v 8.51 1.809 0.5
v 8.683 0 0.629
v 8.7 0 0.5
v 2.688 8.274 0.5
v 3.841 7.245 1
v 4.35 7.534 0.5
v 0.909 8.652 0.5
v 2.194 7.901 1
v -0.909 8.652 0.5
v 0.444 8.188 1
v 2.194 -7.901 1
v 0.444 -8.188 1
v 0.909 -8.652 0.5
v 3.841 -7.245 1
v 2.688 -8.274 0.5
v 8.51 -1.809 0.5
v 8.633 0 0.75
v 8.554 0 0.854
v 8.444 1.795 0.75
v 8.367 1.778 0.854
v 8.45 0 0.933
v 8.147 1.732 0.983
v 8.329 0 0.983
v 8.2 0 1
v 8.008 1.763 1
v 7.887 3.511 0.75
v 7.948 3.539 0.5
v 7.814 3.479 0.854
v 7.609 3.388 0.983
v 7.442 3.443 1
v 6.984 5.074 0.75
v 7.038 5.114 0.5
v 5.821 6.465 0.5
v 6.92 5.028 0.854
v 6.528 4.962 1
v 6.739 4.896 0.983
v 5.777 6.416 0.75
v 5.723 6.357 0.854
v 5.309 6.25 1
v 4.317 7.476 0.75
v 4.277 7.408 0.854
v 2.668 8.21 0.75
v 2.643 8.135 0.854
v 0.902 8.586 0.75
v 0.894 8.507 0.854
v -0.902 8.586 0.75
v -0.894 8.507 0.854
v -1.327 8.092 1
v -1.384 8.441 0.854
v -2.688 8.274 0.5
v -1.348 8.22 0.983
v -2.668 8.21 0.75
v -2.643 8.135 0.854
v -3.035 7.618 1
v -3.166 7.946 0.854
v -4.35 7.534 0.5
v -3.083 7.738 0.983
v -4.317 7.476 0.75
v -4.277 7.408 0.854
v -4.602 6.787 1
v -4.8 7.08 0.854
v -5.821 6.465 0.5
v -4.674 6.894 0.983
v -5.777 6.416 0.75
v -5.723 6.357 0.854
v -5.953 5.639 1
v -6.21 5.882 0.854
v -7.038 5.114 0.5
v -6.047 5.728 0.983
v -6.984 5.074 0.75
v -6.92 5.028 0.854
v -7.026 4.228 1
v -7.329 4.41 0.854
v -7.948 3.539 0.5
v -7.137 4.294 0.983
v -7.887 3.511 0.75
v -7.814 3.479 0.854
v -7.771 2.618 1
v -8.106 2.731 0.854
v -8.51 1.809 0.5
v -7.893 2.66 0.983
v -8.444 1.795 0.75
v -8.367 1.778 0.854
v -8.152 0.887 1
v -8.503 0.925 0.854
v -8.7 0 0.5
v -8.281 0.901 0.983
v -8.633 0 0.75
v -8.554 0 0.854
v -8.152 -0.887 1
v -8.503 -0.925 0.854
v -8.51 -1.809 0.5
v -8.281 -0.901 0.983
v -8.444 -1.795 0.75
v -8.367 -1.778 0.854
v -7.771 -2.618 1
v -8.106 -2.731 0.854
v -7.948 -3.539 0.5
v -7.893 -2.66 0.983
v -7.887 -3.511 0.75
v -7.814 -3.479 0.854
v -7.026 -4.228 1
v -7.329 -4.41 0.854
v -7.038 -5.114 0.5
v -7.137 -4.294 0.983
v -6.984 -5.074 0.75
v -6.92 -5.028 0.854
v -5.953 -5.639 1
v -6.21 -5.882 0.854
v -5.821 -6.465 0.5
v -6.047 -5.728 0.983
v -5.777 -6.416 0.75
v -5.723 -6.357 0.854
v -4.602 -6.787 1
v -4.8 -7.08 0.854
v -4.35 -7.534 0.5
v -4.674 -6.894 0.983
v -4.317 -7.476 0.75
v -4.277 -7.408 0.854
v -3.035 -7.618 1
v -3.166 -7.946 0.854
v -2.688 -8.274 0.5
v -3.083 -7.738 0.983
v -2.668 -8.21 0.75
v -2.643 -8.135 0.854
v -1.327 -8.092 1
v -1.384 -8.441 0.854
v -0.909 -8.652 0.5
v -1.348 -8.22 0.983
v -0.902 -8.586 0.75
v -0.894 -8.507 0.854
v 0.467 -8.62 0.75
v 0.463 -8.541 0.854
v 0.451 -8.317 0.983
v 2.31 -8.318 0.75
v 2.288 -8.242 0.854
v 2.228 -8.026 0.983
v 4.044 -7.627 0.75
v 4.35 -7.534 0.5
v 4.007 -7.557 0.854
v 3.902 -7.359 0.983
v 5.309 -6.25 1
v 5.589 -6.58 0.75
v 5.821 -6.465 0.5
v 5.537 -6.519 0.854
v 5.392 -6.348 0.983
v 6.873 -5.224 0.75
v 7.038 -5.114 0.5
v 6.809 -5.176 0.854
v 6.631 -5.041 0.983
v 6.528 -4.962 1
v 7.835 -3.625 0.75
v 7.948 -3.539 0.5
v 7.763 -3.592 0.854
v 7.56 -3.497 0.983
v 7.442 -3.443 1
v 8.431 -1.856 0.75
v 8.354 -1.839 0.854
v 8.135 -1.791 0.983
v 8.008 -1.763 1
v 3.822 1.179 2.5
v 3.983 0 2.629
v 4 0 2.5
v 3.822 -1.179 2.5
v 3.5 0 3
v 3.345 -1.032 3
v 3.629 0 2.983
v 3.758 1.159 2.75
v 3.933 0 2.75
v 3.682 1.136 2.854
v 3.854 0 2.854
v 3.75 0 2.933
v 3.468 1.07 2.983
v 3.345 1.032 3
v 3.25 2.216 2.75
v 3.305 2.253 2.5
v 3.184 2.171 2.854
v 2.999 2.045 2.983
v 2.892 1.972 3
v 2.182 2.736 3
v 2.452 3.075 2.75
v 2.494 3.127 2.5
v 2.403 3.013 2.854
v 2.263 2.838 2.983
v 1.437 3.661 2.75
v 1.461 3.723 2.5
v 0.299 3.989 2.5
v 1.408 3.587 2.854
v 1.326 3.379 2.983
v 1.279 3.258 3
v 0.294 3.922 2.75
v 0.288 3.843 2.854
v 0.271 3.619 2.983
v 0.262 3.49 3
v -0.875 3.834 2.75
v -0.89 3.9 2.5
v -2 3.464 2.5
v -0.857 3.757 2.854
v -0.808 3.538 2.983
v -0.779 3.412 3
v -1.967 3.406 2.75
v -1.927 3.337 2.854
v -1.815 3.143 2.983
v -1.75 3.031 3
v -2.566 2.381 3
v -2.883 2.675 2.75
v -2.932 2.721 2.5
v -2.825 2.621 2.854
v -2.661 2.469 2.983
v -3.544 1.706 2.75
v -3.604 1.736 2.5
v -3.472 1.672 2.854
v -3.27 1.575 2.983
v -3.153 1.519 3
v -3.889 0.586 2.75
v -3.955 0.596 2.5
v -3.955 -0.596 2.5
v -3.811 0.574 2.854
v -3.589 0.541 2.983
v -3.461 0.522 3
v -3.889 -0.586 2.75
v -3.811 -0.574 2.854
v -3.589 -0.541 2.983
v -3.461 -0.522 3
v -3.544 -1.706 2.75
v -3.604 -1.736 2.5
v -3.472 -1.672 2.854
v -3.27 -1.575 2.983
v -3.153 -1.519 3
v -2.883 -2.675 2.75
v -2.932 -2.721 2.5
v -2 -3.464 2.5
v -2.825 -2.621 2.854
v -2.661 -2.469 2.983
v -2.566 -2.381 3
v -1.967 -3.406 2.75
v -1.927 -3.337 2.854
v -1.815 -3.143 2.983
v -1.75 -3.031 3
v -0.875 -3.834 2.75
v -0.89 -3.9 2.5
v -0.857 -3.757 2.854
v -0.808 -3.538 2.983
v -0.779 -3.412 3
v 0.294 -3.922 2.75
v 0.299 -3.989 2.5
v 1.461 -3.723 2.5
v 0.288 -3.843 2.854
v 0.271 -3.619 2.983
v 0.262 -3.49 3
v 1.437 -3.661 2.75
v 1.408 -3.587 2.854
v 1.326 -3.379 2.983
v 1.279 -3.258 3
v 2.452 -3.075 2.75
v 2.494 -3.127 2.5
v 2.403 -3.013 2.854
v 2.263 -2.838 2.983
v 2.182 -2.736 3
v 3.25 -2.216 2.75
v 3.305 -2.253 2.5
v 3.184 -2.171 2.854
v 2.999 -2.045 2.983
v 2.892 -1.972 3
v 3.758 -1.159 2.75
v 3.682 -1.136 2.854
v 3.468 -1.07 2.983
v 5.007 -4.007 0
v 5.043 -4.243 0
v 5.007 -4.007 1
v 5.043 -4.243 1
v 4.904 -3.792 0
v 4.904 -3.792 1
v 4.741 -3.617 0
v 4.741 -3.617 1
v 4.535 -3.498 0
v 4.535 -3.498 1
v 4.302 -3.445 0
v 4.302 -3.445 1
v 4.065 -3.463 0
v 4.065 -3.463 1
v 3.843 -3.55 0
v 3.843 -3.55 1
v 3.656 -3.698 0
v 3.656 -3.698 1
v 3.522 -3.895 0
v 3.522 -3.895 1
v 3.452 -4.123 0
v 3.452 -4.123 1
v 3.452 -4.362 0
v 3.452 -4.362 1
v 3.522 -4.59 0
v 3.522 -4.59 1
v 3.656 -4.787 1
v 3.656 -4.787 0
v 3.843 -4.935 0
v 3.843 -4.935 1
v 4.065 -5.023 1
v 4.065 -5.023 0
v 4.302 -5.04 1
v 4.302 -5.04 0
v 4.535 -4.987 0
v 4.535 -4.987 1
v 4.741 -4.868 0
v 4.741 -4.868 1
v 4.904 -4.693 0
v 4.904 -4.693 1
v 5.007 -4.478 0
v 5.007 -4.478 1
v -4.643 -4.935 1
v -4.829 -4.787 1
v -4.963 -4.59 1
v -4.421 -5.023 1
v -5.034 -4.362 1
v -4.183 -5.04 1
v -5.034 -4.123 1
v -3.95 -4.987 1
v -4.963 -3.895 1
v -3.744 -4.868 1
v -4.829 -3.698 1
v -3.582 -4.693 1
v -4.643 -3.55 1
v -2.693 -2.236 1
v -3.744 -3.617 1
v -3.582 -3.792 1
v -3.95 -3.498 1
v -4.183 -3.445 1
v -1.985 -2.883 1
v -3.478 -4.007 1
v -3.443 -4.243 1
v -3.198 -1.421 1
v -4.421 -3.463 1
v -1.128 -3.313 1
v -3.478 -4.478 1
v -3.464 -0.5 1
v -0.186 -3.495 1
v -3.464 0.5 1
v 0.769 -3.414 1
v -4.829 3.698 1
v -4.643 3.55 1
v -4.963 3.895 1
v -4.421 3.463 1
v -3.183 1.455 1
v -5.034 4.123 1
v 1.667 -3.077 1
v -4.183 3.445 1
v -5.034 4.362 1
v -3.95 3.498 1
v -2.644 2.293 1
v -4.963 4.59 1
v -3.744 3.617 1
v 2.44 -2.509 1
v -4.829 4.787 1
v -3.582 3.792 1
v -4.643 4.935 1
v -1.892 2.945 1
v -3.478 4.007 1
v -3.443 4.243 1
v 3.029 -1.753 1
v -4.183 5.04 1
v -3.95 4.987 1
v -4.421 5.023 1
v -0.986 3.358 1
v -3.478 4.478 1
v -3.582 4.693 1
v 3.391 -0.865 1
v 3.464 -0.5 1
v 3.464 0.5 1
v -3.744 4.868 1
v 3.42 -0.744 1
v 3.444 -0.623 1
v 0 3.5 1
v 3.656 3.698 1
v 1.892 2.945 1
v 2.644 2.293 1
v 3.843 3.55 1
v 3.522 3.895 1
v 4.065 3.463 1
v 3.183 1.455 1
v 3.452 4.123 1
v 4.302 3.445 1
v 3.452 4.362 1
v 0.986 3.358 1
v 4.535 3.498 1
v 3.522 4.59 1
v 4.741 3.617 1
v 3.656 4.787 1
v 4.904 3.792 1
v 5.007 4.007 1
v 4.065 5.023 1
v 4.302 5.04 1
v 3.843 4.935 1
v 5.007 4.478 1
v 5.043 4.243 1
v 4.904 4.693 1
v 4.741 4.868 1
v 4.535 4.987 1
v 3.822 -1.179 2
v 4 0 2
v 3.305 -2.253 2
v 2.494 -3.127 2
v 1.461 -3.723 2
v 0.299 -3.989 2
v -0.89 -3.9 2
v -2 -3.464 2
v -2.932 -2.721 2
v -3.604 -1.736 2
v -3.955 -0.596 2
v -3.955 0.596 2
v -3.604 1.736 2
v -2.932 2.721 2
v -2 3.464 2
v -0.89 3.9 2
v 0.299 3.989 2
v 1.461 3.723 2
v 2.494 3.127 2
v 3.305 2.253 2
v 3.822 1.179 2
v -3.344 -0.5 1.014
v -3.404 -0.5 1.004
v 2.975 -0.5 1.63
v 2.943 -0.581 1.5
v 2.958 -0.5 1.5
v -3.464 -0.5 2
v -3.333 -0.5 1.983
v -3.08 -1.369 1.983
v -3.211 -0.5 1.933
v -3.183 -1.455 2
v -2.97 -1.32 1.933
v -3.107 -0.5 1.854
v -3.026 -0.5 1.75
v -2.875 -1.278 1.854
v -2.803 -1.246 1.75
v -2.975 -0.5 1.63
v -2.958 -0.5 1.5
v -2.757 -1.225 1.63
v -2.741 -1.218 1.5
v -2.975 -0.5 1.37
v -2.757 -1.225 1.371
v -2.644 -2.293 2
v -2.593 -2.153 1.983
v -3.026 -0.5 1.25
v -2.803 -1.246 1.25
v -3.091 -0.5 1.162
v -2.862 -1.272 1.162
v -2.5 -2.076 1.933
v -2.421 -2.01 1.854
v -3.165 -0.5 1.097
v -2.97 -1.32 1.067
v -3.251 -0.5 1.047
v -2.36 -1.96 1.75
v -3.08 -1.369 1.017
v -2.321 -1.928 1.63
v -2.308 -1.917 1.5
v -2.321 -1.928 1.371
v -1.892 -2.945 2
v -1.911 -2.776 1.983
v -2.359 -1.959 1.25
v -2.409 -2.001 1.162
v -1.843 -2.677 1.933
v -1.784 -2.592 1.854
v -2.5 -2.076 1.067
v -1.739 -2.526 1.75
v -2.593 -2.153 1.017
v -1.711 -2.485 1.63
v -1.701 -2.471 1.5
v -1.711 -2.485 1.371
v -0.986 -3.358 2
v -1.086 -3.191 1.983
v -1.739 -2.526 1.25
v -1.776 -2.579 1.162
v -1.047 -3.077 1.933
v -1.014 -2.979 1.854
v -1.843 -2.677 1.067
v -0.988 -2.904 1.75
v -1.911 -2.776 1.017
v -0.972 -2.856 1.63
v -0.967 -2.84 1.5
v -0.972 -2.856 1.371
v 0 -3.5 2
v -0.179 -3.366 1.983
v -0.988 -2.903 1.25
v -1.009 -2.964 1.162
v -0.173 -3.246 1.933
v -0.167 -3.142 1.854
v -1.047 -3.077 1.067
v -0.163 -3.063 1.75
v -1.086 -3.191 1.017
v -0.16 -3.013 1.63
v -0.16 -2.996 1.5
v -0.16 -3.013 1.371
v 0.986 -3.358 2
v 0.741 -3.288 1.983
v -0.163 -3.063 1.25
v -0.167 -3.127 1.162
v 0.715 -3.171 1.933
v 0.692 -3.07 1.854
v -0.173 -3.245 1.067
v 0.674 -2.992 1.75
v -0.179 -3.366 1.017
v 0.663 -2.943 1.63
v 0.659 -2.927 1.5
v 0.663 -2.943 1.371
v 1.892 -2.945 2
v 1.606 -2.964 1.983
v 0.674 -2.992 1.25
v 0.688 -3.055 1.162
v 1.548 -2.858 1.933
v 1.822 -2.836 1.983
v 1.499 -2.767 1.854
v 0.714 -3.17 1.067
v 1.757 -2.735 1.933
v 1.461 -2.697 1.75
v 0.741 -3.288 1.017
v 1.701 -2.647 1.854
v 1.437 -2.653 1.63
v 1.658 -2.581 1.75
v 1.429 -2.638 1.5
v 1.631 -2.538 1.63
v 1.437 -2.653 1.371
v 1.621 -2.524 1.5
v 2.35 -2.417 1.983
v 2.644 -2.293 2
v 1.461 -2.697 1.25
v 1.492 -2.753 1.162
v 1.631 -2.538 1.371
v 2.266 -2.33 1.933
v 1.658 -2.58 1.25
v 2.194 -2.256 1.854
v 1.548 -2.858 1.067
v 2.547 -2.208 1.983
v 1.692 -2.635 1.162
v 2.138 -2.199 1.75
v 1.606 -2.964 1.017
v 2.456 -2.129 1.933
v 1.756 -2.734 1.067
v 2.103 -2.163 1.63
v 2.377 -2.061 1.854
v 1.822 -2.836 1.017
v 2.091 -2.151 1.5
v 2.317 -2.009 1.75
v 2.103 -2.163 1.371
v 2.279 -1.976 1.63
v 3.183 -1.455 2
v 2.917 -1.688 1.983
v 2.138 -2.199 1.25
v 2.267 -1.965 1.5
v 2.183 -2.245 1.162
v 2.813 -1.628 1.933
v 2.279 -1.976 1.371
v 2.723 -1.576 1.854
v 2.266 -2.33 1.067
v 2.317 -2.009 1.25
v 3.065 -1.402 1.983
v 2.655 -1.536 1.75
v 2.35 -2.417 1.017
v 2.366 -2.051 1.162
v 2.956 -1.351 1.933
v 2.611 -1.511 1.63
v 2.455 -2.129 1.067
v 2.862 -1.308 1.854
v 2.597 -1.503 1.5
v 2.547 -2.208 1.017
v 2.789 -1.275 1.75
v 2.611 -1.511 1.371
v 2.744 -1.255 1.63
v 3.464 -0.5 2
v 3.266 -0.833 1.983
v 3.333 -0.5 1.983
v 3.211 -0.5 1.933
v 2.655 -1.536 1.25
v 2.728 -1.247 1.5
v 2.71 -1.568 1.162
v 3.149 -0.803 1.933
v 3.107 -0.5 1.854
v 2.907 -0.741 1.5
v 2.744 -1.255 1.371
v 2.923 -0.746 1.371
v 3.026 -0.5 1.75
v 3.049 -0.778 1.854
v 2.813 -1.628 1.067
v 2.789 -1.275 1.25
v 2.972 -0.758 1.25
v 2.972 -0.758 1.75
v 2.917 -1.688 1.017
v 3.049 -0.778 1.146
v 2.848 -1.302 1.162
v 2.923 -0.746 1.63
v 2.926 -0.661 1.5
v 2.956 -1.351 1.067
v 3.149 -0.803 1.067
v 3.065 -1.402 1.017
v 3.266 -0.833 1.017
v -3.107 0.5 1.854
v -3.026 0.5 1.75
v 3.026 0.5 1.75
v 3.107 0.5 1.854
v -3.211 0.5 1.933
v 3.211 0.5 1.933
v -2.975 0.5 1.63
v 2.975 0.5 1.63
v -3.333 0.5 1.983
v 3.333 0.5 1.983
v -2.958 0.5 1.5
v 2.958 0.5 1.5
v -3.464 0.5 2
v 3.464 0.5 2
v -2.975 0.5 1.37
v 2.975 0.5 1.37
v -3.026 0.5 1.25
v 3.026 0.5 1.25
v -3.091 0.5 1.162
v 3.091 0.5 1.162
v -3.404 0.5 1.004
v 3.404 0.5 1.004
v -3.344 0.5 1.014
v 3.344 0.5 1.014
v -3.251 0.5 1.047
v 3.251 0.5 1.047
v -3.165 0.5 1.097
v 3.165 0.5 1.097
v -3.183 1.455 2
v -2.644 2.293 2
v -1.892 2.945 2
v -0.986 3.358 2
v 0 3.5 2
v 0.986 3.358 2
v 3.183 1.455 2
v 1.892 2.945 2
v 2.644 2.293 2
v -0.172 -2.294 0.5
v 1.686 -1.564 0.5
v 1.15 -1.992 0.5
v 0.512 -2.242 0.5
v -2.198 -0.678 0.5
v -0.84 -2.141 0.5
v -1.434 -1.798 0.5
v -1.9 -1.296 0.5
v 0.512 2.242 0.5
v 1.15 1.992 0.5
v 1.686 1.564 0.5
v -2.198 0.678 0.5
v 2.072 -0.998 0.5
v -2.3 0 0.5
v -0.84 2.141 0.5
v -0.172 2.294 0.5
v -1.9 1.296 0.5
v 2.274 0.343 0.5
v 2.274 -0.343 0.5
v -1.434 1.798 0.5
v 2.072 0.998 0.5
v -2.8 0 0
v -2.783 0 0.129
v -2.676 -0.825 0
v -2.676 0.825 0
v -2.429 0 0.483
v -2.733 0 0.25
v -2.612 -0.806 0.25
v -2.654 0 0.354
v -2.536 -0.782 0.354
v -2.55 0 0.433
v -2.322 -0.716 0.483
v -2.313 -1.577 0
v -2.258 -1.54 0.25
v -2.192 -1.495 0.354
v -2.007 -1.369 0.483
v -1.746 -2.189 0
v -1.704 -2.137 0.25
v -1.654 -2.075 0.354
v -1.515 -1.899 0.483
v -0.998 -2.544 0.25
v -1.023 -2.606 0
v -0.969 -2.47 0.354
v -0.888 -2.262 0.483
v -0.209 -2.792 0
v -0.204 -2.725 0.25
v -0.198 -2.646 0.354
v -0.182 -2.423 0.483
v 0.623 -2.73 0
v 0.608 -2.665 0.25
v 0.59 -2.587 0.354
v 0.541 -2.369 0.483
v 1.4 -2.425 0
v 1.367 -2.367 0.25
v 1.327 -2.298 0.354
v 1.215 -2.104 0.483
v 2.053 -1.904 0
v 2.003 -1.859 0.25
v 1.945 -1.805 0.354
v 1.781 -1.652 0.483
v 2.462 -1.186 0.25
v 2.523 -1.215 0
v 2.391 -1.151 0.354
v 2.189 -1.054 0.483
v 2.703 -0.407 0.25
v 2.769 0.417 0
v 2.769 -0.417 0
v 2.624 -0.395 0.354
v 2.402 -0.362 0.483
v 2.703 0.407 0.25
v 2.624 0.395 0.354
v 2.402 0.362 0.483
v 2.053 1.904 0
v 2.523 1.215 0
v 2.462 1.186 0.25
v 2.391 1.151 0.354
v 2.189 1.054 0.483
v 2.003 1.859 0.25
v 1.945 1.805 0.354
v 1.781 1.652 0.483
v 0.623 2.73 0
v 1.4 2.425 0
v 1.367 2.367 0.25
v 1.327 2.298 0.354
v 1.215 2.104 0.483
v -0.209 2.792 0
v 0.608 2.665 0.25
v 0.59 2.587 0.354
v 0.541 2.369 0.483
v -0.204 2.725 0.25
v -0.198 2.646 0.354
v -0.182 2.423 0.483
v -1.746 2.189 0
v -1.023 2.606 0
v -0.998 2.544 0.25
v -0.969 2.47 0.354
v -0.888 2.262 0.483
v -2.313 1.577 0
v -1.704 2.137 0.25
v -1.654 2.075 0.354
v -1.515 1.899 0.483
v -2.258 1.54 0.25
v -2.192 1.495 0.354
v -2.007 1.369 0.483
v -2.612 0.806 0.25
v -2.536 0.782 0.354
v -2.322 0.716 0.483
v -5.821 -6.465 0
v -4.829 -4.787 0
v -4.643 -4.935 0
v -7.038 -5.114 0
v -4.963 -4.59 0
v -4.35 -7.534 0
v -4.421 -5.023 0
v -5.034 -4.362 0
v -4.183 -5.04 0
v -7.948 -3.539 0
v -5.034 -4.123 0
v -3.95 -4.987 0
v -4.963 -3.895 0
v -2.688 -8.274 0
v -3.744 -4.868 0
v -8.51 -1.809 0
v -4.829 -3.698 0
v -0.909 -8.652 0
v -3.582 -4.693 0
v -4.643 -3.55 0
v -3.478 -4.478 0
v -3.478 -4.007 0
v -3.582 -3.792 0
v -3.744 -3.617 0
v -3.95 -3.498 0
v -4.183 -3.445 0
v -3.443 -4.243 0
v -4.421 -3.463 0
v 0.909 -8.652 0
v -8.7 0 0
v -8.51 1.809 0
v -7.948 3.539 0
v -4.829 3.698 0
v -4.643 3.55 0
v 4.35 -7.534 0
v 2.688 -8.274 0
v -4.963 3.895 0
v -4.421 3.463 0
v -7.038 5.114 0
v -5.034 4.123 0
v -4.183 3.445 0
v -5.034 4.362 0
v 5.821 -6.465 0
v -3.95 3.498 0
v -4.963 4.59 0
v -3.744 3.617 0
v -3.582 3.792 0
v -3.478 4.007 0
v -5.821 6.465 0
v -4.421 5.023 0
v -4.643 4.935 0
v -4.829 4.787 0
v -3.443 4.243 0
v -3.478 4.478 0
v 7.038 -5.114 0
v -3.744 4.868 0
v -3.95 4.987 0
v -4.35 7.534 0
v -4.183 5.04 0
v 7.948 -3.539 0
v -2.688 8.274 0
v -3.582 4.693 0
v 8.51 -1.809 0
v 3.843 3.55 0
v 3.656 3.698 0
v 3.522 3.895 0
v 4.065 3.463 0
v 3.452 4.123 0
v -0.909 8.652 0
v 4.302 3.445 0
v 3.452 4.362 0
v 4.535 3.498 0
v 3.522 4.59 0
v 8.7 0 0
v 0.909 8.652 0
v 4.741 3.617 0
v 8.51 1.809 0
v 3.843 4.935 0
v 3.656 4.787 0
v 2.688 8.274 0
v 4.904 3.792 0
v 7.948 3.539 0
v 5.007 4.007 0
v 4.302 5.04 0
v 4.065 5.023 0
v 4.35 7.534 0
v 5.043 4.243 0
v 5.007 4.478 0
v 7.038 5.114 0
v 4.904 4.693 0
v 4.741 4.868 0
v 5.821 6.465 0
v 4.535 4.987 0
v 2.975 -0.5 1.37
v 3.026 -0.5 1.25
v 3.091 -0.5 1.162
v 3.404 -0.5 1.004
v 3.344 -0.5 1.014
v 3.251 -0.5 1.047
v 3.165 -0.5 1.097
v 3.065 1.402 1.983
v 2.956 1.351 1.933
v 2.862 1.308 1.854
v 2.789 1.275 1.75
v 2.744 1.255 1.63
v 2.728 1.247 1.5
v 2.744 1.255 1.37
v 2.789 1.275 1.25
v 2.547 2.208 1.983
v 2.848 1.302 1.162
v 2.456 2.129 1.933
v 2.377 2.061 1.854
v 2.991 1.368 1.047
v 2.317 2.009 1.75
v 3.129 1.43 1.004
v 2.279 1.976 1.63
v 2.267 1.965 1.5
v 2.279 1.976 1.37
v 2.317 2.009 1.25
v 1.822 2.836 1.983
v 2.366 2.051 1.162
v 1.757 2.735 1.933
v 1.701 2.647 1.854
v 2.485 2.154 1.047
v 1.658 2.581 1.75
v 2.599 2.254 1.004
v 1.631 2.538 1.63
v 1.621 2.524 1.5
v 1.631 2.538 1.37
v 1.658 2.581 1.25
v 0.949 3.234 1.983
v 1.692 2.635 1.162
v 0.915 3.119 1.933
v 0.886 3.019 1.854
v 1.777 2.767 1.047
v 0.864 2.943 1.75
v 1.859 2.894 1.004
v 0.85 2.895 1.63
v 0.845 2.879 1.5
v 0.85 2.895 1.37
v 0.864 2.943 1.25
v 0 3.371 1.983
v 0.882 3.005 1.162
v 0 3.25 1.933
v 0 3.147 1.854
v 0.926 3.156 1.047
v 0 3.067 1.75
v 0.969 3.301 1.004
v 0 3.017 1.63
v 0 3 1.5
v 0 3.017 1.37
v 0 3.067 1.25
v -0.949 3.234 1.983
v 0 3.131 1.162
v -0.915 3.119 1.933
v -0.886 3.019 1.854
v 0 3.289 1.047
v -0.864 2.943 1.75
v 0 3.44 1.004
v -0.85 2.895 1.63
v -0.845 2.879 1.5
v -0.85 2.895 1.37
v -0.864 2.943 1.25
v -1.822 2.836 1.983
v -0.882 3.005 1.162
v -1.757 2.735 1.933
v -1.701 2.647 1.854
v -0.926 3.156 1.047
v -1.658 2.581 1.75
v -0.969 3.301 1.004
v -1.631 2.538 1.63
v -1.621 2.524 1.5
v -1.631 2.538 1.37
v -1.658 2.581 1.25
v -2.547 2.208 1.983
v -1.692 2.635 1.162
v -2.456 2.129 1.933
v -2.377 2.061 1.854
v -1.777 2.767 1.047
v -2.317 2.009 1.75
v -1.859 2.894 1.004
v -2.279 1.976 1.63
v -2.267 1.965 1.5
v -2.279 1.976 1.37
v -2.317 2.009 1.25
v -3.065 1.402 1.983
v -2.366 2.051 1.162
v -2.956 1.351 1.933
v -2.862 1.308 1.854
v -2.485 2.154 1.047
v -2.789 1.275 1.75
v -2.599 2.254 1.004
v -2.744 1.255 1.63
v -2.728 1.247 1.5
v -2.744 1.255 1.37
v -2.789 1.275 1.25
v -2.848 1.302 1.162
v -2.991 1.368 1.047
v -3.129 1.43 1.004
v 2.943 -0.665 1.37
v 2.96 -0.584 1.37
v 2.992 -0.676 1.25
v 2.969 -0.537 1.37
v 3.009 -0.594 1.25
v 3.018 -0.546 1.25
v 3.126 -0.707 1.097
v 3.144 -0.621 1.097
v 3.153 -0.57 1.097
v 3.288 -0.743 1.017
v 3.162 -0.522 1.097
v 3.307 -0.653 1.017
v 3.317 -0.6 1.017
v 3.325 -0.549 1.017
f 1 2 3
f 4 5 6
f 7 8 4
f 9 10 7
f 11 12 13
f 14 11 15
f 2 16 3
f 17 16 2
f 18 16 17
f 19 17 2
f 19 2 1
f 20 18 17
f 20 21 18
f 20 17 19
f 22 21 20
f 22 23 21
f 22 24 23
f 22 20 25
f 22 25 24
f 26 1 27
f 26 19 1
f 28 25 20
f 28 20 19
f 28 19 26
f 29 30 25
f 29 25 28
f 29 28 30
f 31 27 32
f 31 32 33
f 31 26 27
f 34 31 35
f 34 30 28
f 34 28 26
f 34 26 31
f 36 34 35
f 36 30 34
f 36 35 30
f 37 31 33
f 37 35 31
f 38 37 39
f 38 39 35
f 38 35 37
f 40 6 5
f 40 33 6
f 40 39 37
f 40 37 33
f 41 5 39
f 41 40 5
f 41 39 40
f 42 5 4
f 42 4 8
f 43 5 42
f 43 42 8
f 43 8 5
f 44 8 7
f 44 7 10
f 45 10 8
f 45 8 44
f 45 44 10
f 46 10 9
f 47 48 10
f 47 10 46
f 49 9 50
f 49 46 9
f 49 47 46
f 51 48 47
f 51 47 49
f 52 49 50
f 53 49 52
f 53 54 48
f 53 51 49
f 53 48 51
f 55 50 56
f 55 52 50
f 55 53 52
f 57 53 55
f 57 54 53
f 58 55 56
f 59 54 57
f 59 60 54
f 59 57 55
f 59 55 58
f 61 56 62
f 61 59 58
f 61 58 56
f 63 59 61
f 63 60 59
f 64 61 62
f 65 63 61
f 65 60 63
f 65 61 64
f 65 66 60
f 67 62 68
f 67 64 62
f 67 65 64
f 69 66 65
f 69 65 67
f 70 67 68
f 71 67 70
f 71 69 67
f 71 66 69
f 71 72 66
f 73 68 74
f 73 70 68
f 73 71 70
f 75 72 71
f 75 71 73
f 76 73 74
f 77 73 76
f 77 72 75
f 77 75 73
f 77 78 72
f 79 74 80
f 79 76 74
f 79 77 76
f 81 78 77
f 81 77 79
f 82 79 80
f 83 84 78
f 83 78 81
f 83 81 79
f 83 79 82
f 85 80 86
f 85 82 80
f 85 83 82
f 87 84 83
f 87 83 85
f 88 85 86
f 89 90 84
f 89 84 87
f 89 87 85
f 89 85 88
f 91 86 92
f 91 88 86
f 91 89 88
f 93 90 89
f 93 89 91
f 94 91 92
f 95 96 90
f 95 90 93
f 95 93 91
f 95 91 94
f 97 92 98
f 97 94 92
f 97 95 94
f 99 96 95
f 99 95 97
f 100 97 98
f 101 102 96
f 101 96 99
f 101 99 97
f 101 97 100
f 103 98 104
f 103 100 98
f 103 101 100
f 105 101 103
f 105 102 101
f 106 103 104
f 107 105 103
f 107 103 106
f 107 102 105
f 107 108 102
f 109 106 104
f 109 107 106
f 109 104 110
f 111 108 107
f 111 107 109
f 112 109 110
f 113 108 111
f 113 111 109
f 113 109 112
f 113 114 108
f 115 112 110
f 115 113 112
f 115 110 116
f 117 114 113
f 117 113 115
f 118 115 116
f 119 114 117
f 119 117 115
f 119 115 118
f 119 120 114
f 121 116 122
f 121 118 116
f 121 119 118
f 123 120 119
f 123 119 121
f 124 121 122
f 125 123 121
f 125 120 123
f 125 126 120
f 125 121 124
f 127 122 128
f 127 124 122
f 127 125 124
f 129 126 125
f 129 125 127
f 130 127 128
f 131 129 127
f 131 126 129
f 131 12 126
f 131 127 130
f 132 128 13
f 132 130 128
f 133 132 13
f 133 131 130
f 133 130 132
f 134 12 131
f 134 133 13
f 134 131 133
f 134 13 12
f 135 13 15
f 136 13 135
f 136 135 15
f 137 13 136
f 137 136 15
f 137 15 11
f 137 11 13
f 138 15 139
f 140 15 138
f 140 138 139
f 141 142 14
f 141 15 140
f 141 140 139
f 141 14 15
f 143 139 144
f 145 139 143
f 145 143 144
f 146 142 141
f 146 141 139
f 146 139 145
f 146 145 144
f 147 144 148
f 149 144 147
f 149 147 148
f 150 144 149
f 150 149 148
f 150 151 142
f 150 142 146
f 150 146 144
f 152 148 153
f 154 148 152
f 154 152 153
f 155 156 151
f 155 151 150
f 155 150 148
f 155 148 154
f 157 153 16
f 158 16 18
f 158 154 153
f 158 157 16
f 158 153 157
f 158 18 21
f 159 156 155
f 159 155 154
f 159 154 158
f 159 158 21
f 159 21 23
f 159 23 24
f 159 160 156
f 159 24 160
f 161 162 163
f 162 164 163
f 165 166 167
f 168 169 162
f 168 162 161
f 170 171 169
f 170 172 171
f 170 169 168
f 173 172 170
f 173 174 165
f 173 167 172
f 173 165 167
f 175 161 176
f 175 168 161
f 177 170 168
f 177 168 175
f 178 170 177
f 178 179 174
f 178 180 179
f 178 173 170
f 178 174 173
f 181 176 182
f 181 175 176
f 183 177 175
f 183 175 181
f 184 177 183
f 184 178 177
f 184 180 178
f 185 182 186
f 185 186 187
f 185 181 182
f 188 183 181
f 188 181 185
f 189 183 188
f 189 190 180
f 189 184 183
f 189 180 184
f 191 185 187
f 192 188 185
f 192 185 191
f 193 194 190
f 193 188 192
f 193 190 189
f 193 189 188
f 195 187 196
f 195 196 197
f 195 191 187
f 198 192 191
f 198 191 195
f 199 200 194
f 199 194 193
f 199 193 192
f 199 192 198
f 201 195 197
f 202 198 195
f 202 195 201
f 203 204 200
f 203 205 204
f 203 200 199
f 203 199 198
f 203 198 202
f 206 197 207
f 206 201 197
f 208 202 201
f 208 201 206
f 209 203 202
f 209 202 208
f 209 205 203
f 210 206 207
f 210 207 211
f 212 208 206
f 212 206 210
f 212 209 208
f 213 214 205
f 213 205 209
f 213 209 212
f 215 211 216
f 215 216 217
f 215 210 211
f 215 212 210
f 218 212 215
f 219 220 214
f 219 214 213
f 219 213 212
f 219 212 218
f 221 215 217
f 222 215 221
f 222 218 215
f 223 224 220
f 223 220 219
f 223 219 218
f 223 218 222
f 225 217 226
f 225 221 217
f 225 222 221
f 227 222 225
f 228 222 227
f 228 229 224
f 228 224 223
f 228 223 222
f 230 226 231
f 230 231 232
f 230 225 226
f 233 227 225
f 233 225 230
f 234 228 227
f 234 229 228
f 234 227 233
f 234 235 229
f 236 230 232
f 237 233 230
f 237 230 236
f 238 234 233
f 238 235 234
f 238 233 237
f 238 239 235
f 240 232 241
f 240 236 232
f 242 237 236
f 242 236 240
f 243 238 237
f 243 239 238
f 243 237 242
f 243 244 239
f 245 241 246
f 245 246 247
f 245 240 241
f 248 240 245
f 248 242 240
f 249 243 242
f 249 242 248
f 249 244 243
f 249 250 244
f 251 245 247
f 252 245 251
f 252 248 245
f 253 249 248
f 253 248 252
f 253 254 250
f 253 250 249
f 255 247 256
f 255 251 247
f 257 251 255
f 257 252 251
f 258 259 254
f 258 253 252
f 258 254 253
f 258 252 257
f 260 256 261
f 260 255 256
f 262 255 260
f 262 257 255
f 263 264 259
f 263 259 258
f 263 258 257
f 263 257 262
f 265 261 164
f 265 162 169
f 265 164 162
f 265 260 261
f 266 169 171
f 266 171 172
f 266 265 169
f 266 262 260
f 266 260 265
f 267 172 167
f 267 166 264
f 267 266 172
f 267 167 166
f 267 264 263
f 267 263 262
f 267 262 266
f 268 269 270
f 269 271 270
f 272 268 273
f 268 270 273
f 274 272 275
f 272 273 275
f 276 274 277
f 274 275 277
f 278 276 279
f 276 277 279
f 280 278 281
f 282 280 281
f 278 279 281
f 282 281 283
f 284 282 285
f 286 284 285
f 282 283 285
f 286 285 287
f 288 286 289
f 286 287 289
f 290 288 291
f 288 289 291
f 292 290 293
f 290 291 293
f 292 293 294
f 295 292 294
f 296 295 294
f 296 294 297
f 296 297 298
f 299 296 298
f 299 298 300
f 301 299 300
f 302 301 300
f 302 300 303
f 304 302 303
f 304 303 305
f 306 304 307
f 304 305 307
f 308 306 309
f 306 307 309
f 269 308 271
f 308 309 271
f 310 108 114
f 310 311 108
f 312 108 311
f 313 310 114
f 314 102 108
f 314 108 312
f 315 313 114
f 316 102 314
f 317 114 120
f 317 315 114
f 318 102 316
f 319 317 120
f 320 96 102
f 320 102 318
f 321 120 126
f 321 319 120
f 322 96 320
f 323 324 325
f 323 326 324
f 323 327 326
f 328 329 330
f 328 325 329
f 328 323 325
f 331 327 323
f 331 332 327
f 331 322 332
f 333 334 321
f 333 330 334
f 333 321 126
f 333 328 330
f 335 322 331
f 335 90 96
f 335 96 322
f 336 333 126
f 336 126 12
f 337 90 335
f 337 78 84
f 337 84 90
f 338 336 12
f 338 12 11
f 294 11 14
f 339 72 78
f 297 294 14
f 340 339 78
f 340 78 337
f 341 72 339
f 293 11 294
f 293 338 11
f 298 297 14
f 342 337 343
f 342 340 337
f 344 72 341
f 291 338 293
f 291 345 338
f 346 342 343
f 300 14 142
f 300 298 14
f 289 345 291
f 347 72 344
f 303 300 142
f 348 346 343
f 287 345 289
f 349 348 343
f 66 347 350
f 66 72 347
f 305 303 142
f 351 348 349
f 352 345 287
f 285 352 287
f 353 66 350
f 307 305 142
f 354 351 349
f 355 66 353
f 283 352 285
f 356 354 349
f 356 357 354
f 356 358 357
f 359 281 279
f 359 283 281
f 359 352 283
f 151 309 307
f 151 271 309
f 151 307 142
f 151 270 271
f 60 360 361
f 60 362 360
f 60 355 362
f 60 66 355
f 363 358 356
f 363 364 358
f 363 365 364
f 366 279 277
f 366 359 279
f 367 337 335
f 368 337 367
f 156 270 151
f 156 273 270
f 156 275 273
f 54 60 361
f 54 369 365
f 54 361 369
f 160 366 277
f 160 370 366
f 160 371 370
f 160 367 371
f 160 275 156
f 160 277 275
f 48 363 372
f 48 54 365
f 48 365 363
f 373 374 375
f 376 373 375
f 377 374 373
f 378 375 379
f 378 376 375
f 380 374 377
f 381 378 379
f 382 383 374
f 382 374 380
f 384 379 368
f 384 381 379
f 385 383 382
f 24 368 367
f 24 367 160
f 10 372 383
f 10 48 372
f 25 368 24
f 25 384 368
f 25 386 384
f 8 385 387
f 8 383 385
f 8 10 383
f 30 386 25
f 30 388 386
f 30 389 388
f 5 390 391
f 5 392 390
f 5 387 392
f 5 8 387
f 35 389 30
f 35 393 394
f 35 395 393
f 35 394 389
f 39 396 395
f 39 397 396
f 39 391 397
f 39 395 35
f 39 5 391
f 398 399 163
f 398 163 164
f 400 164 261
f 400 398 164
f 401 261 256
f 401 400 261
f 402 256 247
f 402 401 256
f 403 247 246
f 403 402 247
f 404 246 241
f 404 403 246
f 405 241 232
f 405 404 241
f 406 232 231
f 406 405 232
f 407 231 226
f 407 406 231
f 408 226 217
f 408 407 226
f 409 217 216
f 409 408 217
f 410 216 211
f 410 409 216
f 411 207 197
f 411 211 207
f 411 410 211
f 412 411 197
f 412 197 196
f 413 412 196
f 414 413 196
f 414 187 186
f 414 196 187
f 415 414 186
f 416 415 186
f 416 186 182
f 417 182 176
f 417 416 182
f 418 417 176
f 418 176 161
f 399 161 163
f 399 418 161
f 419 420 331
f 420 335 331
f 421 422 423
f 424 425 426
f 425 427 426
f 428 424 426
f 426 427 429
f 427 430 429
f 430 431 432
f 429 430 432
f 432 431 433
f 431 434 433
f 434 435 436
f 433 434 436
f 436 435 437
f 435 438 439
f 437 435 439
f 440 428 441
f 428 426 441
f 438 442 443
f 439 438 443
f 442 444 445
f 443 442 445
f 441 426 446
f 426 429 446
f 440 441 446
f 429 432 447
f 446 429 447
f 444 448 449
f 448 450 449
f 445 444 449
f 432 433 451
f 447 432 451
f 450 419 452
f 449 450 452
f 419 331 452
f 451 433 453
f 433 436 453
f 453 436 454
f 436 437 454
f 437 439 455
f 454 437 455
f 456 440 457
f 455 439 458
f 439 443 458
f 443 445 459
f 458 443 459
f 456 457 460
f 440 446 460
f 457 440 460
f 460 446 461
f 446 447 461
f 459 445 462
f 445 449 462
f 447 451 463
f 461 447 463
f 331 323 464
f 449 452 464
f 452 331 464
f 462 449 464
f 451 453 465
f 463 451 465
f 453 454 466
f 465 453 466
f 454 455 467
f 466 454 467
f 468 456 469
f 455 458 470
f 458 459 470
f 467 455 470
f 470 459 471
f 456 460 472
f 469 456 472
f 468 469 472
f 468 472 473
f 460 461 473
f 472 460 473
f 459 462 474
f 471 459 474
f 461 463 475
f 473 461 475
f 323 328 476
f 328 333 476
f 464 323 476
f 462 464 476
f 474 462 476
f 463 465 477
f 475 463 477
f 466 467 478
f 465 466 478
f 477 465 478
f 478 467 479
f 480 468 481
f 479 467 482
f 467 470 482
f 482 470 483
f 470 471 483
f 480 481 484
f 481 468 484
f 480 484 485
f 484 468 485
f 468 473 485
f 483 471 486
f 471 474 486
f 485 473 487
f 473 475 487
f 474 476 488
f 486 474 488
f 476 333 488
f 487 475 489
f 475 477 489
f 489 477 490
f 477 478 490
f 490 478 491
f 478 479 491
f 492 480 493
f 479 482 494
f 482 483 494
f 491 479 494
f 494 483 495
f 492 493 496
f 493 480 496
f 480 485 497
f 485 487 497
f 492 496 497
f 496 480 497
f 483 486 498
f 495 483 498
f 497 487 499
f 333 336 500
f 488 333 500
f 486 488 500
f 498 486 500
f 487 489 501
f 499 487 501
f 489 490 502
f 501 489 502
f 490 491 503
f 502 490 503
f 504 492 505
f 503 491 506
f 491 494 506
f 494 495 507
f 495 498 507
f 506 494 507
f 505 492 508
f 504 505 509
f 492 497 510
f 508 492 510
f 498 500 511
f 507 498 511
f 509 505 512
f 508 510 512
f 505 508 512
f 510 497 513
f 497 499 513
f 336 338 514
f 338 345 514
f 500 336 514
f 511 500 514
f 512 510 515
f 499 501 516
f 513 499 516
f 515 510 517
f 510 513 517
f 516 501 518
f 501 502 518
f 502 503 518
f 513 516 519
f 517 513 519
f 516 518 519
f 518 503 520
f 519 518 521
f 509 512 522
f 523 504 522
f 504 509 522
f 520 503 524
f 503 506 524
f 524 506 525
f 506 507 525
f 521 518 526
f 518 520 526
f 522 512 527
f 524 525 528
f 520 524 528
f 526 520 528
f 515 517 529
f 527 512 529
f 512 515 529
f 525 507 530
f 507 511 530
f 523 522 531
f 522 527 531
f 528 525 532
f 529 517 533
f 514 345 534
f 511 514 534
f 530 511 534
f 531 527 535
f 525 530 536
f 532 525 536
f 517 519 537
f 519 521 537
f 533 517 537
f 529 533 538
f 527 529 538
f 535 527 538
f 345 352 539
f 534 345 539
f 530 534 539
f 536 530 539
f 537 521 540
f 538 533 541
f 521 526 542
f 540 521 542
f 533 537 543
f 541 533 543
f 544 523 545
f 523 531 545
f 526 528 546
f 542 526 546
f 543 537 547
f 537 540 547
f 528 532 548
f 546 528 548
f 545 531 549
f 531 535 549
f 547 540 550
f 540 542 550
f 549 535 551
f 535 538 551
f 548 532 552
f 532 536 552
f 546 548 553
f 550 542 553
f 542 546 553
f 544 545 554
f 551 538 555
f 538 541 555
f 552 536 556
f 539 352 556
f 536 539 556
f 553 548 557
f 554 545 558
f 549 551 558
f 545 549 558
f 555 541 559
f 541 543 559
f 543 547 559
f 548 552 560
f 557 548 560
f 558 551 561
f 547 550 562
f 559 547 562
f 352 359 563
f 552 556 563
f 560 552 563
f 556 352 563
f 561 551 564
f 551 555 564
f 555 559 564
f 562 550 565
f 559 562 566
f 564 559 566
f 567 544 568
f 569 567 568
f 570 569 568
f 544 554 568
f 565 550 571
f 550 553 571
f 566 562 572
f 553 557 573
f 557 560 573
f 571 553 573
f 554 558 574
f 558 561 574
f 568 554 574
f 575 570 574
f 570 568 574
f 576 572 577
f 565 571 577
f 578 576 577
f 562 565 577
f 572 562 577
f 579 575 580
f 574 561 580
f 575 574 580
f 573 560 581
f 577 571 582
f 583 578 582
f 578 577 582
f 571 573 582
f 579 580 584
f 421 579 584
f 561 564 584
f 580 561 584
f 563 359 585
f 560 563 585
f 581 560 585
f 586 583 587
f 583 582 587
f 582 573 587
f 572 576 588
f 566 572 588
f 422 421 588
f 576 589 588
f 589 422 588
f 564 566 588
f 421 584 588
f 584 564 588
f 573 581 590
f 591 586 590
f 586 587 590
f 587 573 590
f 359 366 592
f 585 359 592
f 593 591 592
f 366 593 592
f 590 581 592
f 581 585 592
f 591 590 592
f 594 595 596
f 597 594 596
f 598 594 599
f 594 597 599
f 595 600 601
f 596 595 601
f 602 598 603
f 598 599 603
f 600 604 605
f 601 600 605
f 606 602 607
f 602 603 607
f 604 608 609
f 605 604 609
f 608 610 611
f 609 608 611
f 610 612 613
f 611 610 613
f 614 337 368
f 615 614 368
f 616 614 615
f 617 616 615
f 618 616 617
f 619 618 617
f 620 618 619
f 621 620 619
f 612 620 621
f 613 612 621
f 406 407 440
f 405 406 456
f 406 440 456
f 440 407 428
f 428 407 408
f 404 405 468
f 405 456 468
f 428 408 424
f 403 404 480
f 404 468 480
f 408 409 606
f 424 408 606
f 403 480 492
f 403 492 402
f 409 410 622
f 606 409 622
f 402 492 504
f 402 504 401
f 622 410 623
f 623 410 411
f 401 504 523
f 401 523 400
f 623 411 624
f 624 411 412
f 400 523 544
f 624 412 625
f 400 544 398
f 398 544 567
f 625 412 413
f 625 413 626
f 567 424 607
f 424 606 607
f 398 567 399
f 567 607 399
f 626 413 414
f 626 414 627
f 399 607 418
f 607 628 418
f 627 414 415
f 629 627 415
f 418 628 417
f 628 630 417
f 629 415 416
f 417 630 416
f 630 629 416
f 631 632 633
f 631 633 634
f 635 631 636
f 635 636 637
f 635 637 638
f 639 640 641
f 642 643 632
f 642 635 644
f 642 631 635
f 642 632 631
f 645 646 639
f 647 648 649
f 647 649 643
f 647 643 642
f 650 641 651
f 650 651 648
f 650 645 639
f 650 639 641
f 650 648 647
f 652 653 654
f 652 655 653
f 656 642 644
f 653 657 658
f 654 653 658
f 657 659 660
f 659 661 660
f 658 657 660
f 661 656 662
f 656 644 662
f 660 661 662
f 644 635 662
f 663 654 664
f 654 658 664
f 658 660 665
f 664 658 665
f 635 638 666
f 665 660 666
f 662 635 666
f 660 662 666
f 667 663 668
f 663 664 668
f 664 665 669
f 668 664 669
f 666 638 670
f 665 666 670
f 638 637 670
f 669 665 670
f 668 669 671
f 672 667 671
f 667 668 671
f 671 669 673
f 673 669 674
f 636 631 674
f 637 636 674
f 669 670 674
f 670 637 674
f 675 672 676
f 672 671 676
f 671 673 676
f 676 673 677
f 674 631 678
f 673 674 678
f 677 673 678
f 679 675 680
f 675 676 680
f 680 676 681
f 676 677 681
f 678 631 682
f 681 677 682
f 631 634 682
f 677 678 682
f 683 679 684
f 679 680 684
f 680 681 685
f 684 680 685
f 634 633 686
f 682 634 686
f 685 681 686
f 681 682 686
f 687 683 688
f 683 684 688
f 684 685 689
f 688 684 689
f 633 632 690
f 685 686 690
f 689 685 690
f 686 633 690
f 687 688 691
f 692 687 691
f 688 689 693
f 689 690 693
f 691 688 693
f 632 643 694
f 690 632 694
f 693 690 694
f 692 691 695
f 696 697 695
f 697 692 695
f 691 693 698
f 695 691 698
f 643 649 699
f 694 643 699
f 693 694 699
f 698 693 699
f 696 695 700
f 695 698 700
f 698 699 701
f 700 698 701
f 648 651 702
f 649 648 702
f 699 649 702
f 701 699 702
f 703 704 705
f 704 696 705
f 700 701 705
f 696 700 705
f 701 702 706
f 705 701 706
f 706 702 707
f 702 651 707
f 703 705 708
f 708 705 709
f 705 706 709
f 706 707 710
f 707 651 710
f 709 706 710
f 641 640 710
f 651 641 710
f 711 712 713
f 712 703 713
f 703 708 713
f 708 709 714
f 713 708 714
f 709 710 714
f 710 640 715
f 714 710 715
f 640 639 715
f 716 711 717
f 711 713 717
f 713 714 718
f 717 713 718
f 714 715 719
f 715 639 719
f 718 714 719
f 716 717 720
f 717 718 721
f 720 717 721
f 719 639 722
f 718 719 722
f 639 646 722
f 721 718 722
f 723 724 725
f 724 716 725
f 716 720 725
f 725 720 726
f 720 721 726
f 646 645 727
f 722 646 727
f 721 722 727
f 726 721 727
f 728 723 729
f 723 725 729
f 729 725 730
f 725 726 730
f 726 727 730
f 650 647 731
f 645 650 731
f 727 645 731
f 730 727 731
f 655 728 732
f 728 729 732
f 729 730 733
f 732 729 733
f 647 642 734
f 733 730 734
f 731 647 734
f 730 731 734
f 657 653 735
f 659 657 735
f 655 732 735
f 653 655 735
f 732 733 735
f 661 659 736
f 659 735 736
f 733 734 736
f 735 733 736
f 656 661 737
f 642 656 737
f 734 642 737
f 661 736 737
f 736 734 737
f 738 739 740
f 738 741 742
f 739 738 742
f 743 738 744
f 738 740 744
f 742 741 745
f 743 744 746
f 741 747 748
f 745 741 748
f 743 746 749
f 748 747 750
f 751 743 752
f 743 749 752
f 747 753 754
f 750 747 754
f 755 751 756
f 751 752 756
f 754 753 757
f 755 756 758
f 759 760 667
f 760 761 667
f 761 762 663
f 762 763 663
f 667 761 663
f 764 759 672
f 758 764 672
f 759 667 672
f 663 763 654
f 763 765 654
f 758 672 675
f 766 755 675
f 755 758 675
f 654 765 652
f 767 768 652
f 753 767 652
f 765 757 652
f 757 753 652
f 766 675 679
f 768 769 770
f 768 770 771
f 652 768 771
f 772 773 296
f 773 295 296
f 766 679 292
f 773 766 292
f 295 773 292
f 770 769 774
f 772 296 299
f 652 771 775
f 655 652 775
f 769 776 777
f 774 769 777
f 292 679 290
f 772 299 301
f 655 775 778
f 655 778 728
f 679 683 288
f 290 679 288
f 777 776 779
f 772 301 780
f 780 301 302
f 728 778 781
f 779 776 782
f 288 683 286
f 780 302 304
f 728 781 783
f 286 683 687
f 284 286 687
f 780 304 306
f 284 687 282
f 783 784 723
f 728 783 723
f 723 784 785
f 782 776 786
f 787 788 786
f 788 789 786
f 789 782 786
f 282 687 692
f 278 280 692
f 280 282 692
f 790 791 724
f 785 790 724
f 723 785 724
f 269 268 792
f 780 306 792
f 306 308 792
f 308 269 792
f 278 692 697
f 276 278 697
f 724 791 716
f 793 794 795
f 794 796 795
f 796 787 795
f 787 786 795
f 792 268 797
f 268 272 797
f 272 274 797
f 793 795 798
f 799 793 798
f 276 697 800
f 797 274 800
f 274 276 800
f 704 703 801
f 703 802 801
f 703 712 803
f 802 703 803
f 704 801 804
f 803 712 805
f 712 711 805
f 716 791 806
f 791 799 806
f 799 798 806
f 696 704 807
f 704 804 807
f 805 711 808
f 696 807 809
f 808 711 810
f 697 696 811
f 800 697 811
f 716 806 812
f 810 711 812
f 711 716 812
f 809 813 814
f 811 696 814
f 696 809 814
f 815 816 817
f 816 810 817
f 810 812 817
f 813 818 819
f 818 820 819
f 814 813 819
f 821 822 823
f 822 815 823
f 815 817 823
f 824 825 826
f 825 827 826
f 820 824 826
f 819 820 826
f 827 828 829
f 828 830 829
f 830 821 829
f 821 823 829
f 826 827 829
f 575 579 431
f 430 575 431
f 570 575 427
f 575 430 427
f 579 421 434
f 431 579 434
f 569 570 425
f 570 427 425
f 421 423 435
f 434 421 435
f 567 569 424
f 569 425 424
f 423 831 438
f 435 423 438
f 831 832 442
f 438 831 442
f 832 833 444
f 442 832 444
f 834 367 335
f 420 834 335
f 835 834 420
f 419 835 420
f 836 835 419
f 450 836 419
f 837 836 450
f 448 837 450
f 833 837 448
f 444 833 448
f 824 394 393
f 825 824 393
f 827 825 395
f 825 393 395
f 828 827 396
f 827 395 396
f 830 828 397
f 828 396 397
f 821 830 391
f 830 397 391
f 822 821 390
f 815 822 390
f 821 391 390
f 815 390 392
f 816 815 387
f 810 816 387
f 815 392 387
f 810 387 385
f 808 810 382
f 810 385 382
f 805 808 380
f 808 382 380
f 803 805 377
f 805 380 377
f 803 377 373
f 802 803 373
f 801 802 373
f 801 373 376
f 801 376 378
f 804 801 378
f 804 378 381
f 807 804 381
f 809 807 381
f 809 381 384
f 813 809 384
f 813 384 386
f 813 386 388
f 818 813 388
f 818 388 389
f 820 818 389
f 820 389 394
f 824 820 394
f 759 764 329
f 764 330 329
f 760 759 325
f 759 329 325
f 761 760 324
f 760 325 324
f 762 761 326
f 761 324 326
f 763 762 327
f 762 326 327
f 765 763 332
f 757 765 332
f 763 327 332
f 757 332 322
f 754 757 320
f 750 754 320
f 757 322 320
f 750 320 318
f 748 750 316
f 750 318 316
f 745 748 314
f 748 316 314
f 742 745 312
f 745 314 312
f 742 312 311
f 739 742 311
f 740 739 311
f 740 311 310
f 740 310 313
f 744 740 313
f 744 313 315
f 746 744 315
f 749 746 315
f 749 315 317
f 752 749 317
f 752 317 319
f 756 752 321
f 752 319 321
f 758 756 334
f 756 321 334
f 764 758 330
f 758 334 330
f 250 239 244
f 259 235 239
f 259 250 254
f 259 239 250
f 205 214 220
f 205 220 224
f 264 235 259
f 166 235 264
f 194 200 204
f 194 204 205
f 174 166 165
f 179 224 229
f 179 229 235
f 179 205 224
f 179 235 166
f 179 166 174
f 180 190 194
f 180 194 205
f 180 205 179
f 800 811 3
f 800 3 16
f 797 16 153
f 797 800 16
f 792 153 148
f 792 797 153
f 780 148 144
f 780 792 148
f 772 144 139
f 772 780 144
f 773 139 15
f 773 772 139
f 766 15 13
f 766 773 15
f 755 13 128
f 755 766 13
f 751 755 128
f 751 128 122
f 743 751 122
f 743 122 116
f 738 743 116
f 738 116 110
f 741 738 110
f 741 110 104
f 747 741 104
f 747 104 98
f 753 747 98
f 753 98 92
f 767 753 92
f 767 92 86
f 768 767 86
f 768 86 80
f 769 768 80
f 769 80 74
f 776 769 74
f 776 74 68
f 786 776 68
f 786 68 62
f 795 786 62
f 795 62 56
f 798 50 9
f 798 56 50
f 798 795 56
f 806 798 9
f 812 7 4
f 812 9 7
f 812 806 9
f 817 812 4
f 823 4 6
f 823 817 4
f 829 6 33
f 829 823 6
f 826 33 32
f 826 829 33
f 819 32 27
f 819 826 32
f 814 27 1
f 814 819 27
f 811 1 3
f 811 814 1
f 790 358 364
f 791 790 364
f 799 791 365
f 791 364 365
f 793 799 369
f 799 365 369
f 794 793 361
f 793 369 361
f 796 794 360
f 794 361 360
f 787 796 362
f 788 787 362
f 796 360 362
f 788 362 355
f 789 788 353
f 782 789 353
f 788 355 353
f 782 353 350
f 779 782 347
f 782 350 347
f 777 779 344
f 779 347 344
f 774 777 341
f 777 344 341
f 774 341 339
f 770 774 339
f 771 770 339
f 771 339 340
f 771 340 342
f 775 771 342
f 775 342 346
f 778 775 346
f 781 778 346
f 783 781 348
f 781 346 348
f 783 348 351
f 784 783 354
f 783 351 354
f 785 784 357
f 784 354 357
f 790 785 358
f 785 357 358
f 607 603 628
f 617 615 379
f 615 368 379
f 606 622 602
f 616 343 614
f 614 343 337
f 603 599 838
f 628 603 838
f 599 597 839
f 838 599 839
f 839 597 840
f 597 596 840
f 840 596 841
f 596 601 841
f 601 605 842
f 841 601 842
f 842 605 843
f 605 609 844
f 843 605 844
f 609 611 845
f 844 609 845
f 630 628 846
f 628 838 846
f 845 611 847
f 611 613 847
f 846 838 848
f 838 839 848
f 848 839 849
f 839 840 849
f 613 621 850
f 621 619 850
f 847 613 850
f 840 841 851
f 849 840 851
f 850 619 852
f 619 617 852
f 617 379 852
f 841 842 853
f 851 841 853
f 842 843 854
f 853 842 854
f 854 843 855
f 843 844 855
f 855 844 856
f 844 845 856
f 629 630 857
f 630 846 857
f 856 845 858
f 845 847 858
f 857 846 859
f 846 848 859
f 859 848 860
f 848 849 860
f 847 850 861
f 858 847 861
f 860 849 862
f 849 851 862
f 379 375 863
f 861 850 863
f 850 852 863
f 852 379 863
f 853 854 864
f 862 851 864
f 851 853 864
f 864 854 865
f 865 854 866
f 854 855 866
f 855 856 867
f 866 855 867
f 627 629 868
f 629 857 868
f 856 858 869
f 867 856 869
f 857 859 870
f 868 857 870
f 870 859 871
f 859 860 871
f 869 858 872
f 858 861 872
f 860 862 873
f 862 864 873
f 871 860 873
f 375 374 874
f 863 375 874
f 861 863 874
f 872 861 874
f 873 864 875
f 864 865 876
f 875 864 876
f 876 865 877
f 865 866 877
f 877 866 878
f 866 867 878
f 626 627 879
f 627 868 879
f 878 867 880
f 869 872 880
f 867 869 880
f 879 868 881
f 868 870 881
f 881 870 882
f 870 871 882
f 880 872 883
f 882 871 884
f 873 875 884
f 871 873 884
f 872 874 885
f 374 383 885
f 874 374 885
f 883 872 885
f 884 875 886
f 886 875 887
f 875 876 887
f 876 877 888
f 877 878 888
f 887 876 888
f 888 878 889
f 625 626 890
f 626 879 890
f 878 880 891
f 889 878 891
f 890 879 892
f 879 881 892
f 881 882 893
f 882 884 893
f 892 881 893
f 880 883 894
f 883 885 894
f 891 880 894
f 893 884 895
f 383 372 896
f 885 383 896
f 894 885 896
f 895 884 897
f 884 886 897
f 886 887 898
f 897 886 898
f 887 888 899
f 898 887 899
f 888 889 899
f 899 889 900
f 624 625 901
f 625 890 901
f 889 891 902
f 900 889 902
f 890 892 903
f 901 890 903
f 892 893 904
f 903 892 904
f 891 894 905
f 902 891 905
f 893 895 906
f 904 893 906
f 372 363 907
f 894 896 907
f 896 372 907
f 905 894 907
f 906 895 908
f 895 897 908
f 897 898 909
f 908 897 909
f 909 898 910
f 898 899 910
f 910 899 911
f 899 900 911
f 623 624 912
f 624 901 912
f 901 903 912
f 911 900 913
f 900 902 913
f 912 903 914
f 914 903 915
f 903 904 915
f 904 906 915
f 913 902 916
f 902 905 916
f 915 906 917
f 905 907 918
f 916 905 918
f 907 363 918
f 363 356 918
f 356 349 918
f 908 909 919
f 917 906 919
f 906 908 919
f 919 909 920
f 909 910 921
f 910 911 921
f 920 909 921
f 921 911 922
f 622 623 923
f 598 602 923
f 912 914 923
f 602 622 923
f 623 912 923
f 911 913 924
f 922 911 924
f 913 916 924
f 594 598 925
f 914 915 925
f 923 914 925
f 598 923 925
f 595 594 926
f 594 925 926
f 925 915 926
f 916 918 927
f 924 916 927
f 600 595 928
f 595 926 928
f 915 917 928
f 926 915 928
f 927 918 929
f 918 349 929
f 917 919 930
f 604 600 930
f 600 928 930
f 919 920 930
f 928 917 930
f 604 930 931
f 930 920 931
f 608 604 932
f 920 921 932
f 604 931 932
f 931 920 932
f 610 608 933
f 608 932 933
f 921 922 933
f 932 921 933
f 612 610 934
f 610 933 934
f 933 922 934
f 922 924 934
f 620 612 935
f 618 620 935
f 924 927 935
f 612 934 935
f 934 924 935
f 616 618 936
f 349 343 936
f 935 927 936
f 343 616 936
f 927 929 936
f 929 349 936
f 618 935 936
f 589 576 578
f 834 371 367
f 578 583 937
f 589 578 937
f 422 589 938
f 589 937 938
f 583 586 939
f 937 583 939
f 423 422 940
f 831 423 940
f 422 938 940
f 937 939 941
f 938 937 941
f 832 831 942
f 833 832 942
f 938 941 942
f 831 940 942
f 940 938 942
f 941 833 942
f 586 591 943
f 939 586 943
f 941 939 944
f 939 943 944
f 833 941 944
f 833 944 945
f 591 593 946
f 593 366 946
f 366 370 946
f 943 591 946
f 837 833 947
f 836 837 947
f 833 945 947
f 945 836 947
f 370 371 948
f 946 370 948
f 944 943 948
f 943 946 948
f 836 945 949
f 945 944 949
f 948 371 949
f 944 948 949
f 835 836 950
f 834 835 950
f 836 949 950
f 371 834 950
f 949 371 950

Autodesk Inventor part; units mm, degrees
ref_plane "YZ Plane" through (0, 0, 0) normal (1, 0, 0) x (0, 1, 0)
ref_plane "XZ Plane" through (0, 0, 0) normal (0, 1, 0) x (-1, 0, 0)
ref_plane "XY Plane" through (0, 0, 0) normal (0, 0, 1) x (1, 0, 0)
sketch "Sketch1" plane through (0, 0, 0) normal (0, 0, 1) x (1, 0, 0)
  circle A0 centre (0, 0) radius 8.7
  dimension "d0" = 17.4
extrude "Extrusion1" add sketch "Sketch1" along normal blind 1
sketch "Sketch2" plane through (0, 0, 1) normal (0, 0, 1) x (1, 0, 0)
  circle A0 centre (4.2426, 4.2426) radius 0.8
  circle A1 centre (-4.2426, 4.2426) radius 0.8
  circle A2 centre (-4.2426, -4.2426) radius 0.8
  circle A3 centre (4.2426, -4.2426) radius 0.8
  dimension "d9" = 1.6
  dimension "d10" = 1.6
  dimension "d11" = 1.6
  dimension "d12" = 1.6
extrude "Extrusion2" cut sketch "Sketch2" against normal up to next
sketch "Sketch3" plane through (0, 0, 0) normal (0, 0, -1) x (-1, 0, 0)
  circle A0 centre (0, 0) radius 2.8
  dimension "d15" = 5.6
extrude "Extrusion3" cut sketch "Sketch3" against normal blind 0.5
fillet "Fillet1" radius 0.5 1 edges at (2.8, 0, 0.5)
fillet "Fillet4" radius 0.5 1 edges at (-8.7, 0, 1)
sketch "Sketch7" plane through (0, 0, 1) normal (0, 0, 1) x (1, 0, 0)
  line L0 (-2.958, 0.5) -> (2.958, 0.5)
  line L1 (2.958, -0.5) -> (-2.958, -0.5)
  arc A0 (2.958, 0.5) -> (-2.958, 0.5) centre (0, 0) ccw
  arc A1 (-2.958, -0.5) -> (2.958, -0.5) centre (0, 0) ccw
  point P0 (0, 0)
extrude "Extrusion7" add sketch "Sketch7" along normal blind 1
sketch "Sketch8" plane through (0, 0, 2) normal (0, 0, 1) x (1, 0, 0)
  circle A0 centre (0, 0) radius 4
  dimension "d38" = 8
extrude "Extrusion8" add sketch "Sketch8" along normal blind 1
fillet "Fillet5" radius 0.5 4 edges at (0, -3, 2) (0, 3, 2) (0, 3, 1) (0, -3, 1)
fillet "Fillet6" radius 0.5 1 edges at (-4, 0, 3)
properties part number "pulley"
